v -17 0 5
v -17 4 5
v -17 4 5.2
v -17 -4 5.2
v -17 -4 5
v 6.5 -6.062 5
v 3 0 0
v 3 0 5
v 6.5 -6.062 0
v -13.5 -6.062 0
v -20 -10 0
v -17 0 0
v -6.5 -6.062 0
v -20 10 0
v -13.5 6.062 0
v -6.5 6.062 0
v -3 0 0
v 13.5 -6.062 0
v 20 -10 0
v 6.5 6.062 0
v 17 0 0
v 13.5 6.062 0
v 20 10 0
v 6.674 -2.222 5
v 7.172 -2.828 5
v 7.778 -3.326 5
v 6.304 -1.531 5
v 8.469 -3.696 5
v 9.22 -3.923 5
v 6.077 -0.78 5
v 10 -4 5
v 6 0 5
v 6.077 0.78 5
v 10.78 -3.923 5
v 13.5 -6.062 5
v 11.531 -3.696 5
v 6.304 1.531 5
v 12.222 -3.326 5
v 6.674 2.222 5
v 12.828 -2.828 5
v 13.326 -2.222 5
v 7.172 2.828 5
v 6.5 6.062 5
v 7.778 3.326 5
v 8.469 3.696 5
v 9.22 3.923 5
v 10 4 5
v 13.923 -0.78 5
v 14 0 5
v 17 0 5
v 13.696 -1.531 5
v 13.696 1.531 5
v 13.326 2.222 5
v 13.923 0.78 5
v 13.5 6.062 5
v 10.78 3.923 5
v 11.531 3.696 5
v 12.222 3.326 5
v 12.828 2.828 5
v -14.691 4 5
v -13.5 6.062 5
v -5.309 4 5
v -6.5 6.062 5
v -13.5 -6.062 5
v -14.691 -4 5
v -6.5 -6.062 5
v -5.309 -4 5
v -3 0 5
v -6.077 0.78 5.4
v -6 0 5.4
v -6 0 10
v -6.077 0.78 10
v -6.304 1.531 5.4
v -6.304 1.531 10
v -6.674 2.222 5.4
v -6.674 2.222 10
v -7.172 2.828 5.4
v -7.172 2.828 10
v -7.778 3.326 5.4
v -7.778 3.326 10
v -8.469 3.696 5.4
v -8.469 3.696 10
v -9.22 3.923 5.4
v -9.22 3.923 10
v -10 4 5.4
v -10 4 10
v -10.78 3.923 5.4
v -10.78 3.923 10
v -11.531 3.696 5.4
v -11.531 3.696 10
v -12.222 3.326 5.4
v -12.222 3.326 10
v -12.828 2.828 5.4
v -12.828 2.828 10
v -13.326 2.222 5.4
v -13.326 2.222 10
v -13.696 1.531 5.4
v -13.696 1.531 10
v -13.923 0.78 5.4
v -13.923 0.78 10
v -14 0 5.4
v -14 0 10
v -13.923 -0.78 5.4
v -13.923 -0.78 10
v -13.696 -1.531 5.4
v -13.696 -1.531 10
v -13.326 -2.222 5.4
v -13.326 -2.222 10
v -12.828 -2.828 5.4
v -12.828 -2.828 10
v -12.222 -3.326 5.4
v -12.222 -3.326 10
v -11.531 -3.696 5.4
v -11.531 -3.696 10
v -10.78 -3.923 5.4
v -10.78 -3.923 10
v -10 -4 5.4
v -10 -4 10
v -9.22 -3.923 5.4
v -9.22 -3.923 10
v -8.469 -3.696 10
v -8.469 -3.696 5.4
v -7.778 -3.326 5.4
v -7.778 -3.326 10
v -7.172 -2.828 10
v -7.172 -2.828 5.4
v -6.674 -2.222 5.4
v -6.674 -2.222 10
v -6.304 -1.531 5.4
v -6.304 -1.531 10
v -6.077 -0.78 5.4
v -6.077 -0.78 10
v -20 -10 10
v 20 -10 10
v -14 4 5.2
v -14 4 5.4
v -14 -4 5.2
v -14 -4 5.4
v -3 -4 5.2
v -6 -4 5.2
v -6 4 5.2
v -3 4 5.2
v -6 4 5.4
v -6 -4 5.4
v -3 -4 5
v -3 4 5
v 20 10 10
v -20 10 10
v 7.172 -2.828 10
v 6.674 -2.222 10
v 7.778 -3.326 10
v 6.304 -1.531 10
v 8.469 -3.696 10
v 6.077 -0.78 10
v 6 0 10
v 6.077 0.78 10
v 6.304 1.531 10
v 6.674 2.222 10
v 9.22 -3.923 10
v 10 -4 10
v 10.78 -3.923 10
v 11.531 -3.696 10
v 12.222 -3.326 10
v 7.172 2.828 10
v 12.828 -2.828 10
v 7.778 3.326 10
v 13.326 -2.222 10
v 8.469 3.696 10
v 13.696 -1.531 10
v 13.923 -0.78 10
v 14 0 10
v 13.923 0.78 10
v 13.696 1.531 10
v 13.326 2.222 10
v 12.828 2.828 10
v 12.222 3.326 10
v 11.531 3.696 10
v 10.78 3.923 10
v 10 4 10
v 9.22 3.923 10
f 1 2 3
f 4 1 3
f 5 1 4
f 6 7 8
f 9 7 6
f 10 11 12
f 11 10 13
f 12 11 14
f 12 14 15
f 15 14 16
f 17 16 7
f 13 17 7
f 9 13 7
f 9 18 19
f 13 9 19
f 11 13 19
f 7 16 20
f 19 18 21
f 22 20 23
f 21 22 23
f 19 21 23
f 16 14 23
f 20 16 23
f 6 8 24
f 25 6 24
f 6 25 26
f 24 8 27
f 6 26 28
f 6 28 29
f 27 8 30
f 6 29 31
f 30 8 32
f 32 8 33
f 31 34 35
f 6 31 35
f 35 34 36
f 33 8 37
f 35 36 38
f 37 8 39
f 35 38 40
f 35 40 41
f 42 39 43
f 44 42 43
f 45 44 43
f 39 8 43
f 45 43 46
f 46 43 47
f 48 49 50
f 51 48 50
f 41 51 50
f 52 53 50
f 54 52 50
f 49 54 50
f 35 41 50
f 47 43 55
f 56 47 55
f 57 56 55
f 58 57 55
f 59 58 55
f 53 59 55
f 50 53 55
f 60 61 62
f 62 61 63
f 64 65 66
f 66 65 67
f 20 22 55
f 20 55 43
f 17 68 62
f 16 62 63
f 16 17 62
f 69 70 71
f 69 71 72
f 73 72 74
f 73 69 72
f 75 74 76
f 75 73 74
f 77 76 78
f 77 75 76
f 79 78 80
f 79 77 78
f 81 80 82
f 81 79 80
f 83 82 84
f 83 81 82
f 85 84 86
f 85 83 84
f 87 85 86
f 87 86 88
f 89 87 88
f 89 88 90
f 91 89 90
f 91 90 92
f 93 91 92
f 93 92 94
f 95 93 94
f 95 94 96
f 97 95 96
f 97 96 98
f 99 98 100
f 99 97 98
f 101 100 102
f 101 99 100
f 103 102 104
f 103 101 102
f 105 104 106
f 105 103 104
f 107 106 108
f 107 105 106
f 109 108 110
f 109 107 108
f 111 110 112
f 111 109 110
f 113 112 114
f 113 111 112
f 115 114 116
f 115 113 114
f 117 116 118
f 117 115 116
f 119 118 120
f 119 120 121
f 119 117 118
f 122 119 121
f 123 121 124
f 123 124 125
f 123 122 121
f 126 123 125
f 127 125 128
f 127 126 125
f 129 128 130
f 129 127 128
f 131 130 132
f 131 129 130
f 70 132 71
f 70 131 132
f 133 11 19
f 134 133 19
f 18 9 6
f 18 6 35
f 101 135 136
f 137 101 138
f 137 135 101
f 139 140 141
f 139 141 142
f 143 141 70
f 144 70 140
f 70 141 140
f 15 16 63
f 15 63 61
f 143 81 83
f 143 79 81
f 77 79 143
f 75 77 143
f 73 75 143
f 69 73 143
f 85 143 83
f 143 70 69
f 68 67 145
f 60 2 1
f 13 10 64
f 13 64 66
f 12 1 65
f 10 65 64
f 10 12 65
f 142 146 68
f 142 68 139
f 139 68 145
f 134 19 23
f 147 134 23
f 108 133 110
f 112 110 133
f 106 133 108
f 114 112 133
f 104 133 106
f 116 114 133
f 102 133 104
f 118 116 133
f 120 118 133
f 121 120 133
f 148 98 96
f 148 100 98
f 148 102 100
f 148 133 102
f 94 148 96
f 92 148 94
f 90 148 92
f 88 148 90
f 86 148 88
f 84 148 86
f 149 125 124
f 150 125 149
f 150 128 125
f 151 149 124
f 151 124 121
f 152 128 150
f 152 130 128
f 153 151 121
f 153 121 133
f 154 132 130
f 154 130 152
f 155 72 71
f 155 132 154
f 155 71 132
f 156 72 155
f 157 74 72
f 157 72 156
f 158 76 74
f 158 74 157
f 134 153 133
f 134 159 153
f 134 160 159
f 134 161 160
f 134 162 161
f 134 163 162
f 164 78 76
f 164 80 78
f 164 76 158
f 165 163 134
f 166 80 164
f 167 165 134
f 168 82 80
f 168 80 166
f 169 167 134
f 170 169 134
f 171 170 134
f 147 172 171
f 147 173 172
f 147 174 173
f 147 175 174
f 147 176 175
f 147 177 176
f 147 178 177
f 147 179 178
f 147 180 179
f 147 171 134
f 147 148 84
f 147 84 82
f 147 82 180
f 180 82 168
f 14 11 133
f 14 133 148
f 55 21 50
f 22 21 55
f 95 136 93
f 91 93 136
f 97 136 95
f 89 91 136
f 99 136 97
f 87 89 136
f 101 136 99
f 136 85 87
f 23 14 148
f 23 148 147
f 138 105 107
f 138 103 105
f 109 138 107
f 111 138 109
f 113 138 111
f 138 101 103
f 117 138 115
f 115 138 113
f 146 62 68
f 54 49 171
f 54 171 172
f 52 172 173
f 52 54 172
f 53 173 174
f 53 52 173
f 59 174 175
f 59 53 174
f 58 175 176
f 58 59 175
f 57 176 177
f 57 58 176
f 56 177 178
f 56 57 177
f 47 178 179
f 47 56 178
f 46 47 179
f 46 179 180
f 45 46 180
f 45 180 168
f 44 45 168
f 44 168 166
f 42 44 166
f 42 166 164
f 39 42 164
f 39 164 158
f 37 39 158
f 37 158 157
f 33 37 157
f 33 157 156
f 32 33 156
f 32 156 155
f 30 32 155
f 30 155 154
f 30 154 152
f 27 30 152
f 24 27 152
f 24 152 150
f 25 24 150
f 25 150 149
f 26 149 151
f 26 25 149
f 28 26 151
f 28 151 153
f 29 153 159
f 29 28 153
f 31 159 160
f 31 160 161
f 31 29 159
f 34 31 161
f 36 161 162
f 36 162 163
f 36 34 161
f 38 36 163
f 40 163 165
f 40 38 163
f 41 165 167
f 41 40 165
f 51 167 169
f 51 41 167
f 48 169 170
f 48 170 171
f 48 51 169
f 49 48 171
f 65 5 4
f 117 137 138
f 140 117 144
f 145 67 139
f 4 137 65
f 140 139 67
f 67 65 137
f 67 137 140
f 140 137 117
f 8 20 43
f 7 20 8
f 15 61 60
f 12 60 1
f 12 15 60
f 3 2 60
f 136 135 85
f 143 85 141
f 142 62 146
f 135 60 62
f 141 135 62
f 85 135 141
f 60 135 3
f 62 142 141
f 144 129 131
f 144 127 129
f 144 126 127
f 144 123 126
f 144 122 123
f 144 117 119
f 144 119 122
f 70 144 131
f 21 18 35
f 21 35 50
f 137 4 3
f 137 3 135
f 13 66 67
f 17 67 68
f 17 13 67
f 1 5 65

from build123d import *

# Parameters (mm, degrees)
SKETCH_W        = 40
SKETCH_H        = 20
SKETCH_R        = 4
PAD_DEPTH       = 10
POCKET_DEPTH    = 5
SKETCH002_W     = 14
SKETCH002_H     = 8
POCKET001_DEPTH = 0.2
SKETCH003_W     = 8
SKETCH003_H     = 8
POCKET002_DEPTH = 0.2


with BuildPart() as part:
    # Sketch → Pad (new body)
    with BuildSketch(Plane.XY):
        Rectangle(SKETCH_W, SKETCH_H)
        with Locations((-10, 0)):
            Circle(SKETCH_R, mode=Mode.SUBTRACT)
        with Locations((10, 0)):
            Circle(SKETCH_R, mode=Mode.SUBTRACT)
    extrude(amount=PAD_DEPTH)

    # Sketch001 → Pocket (cut)
    with BuildSketch(Plane.XY):
        Polygon((-6.5, 6.062178), (-13.5, 6.062178), (-17, 0), (-13.5, -6.062178), (-6.5, -6.062178), (-3, 0), align=None)
        Polygon((13.5, 6.062178), (6.5, 6.062178), (3, 0), (6.5, -6.062178), (13.5, -6.062178), (17, 0), align=None)
    extrude(amount=POCKET_DEPTH, mode=Mode.SUBTRACT)

    # Sketch002 (on Face21 of Pocket) → Pocket001 (cut)
    with BuildSketch(Plane(origin=(0, 0, 5), x_dir=(1, 0, 0), z_dir=(0, 0, -1))):
        with Locations((-10, 0)):
            Rectangle(SKETCH002_W, SKETCH002_H)
    extrude(amount=-POCKET001_DEPTH, mode=Mode.SUBTRACT)

    # Sketch003 (on Face28 of Pocket001) → Pocket002 (cut)
    with BuildSketch(Plane(origin=(0, 0, 5.2), x_dir=(1, 0, 0), z_dir=(0, 0, -1))):
        with Locations((-10, 0)):
            Rectangle(SKETCH003_W, SKETCH003_H)
    extrude(amount=-POCKET002_DEPTH, mode=Mode.SUBTRACT)


solid = part.part
